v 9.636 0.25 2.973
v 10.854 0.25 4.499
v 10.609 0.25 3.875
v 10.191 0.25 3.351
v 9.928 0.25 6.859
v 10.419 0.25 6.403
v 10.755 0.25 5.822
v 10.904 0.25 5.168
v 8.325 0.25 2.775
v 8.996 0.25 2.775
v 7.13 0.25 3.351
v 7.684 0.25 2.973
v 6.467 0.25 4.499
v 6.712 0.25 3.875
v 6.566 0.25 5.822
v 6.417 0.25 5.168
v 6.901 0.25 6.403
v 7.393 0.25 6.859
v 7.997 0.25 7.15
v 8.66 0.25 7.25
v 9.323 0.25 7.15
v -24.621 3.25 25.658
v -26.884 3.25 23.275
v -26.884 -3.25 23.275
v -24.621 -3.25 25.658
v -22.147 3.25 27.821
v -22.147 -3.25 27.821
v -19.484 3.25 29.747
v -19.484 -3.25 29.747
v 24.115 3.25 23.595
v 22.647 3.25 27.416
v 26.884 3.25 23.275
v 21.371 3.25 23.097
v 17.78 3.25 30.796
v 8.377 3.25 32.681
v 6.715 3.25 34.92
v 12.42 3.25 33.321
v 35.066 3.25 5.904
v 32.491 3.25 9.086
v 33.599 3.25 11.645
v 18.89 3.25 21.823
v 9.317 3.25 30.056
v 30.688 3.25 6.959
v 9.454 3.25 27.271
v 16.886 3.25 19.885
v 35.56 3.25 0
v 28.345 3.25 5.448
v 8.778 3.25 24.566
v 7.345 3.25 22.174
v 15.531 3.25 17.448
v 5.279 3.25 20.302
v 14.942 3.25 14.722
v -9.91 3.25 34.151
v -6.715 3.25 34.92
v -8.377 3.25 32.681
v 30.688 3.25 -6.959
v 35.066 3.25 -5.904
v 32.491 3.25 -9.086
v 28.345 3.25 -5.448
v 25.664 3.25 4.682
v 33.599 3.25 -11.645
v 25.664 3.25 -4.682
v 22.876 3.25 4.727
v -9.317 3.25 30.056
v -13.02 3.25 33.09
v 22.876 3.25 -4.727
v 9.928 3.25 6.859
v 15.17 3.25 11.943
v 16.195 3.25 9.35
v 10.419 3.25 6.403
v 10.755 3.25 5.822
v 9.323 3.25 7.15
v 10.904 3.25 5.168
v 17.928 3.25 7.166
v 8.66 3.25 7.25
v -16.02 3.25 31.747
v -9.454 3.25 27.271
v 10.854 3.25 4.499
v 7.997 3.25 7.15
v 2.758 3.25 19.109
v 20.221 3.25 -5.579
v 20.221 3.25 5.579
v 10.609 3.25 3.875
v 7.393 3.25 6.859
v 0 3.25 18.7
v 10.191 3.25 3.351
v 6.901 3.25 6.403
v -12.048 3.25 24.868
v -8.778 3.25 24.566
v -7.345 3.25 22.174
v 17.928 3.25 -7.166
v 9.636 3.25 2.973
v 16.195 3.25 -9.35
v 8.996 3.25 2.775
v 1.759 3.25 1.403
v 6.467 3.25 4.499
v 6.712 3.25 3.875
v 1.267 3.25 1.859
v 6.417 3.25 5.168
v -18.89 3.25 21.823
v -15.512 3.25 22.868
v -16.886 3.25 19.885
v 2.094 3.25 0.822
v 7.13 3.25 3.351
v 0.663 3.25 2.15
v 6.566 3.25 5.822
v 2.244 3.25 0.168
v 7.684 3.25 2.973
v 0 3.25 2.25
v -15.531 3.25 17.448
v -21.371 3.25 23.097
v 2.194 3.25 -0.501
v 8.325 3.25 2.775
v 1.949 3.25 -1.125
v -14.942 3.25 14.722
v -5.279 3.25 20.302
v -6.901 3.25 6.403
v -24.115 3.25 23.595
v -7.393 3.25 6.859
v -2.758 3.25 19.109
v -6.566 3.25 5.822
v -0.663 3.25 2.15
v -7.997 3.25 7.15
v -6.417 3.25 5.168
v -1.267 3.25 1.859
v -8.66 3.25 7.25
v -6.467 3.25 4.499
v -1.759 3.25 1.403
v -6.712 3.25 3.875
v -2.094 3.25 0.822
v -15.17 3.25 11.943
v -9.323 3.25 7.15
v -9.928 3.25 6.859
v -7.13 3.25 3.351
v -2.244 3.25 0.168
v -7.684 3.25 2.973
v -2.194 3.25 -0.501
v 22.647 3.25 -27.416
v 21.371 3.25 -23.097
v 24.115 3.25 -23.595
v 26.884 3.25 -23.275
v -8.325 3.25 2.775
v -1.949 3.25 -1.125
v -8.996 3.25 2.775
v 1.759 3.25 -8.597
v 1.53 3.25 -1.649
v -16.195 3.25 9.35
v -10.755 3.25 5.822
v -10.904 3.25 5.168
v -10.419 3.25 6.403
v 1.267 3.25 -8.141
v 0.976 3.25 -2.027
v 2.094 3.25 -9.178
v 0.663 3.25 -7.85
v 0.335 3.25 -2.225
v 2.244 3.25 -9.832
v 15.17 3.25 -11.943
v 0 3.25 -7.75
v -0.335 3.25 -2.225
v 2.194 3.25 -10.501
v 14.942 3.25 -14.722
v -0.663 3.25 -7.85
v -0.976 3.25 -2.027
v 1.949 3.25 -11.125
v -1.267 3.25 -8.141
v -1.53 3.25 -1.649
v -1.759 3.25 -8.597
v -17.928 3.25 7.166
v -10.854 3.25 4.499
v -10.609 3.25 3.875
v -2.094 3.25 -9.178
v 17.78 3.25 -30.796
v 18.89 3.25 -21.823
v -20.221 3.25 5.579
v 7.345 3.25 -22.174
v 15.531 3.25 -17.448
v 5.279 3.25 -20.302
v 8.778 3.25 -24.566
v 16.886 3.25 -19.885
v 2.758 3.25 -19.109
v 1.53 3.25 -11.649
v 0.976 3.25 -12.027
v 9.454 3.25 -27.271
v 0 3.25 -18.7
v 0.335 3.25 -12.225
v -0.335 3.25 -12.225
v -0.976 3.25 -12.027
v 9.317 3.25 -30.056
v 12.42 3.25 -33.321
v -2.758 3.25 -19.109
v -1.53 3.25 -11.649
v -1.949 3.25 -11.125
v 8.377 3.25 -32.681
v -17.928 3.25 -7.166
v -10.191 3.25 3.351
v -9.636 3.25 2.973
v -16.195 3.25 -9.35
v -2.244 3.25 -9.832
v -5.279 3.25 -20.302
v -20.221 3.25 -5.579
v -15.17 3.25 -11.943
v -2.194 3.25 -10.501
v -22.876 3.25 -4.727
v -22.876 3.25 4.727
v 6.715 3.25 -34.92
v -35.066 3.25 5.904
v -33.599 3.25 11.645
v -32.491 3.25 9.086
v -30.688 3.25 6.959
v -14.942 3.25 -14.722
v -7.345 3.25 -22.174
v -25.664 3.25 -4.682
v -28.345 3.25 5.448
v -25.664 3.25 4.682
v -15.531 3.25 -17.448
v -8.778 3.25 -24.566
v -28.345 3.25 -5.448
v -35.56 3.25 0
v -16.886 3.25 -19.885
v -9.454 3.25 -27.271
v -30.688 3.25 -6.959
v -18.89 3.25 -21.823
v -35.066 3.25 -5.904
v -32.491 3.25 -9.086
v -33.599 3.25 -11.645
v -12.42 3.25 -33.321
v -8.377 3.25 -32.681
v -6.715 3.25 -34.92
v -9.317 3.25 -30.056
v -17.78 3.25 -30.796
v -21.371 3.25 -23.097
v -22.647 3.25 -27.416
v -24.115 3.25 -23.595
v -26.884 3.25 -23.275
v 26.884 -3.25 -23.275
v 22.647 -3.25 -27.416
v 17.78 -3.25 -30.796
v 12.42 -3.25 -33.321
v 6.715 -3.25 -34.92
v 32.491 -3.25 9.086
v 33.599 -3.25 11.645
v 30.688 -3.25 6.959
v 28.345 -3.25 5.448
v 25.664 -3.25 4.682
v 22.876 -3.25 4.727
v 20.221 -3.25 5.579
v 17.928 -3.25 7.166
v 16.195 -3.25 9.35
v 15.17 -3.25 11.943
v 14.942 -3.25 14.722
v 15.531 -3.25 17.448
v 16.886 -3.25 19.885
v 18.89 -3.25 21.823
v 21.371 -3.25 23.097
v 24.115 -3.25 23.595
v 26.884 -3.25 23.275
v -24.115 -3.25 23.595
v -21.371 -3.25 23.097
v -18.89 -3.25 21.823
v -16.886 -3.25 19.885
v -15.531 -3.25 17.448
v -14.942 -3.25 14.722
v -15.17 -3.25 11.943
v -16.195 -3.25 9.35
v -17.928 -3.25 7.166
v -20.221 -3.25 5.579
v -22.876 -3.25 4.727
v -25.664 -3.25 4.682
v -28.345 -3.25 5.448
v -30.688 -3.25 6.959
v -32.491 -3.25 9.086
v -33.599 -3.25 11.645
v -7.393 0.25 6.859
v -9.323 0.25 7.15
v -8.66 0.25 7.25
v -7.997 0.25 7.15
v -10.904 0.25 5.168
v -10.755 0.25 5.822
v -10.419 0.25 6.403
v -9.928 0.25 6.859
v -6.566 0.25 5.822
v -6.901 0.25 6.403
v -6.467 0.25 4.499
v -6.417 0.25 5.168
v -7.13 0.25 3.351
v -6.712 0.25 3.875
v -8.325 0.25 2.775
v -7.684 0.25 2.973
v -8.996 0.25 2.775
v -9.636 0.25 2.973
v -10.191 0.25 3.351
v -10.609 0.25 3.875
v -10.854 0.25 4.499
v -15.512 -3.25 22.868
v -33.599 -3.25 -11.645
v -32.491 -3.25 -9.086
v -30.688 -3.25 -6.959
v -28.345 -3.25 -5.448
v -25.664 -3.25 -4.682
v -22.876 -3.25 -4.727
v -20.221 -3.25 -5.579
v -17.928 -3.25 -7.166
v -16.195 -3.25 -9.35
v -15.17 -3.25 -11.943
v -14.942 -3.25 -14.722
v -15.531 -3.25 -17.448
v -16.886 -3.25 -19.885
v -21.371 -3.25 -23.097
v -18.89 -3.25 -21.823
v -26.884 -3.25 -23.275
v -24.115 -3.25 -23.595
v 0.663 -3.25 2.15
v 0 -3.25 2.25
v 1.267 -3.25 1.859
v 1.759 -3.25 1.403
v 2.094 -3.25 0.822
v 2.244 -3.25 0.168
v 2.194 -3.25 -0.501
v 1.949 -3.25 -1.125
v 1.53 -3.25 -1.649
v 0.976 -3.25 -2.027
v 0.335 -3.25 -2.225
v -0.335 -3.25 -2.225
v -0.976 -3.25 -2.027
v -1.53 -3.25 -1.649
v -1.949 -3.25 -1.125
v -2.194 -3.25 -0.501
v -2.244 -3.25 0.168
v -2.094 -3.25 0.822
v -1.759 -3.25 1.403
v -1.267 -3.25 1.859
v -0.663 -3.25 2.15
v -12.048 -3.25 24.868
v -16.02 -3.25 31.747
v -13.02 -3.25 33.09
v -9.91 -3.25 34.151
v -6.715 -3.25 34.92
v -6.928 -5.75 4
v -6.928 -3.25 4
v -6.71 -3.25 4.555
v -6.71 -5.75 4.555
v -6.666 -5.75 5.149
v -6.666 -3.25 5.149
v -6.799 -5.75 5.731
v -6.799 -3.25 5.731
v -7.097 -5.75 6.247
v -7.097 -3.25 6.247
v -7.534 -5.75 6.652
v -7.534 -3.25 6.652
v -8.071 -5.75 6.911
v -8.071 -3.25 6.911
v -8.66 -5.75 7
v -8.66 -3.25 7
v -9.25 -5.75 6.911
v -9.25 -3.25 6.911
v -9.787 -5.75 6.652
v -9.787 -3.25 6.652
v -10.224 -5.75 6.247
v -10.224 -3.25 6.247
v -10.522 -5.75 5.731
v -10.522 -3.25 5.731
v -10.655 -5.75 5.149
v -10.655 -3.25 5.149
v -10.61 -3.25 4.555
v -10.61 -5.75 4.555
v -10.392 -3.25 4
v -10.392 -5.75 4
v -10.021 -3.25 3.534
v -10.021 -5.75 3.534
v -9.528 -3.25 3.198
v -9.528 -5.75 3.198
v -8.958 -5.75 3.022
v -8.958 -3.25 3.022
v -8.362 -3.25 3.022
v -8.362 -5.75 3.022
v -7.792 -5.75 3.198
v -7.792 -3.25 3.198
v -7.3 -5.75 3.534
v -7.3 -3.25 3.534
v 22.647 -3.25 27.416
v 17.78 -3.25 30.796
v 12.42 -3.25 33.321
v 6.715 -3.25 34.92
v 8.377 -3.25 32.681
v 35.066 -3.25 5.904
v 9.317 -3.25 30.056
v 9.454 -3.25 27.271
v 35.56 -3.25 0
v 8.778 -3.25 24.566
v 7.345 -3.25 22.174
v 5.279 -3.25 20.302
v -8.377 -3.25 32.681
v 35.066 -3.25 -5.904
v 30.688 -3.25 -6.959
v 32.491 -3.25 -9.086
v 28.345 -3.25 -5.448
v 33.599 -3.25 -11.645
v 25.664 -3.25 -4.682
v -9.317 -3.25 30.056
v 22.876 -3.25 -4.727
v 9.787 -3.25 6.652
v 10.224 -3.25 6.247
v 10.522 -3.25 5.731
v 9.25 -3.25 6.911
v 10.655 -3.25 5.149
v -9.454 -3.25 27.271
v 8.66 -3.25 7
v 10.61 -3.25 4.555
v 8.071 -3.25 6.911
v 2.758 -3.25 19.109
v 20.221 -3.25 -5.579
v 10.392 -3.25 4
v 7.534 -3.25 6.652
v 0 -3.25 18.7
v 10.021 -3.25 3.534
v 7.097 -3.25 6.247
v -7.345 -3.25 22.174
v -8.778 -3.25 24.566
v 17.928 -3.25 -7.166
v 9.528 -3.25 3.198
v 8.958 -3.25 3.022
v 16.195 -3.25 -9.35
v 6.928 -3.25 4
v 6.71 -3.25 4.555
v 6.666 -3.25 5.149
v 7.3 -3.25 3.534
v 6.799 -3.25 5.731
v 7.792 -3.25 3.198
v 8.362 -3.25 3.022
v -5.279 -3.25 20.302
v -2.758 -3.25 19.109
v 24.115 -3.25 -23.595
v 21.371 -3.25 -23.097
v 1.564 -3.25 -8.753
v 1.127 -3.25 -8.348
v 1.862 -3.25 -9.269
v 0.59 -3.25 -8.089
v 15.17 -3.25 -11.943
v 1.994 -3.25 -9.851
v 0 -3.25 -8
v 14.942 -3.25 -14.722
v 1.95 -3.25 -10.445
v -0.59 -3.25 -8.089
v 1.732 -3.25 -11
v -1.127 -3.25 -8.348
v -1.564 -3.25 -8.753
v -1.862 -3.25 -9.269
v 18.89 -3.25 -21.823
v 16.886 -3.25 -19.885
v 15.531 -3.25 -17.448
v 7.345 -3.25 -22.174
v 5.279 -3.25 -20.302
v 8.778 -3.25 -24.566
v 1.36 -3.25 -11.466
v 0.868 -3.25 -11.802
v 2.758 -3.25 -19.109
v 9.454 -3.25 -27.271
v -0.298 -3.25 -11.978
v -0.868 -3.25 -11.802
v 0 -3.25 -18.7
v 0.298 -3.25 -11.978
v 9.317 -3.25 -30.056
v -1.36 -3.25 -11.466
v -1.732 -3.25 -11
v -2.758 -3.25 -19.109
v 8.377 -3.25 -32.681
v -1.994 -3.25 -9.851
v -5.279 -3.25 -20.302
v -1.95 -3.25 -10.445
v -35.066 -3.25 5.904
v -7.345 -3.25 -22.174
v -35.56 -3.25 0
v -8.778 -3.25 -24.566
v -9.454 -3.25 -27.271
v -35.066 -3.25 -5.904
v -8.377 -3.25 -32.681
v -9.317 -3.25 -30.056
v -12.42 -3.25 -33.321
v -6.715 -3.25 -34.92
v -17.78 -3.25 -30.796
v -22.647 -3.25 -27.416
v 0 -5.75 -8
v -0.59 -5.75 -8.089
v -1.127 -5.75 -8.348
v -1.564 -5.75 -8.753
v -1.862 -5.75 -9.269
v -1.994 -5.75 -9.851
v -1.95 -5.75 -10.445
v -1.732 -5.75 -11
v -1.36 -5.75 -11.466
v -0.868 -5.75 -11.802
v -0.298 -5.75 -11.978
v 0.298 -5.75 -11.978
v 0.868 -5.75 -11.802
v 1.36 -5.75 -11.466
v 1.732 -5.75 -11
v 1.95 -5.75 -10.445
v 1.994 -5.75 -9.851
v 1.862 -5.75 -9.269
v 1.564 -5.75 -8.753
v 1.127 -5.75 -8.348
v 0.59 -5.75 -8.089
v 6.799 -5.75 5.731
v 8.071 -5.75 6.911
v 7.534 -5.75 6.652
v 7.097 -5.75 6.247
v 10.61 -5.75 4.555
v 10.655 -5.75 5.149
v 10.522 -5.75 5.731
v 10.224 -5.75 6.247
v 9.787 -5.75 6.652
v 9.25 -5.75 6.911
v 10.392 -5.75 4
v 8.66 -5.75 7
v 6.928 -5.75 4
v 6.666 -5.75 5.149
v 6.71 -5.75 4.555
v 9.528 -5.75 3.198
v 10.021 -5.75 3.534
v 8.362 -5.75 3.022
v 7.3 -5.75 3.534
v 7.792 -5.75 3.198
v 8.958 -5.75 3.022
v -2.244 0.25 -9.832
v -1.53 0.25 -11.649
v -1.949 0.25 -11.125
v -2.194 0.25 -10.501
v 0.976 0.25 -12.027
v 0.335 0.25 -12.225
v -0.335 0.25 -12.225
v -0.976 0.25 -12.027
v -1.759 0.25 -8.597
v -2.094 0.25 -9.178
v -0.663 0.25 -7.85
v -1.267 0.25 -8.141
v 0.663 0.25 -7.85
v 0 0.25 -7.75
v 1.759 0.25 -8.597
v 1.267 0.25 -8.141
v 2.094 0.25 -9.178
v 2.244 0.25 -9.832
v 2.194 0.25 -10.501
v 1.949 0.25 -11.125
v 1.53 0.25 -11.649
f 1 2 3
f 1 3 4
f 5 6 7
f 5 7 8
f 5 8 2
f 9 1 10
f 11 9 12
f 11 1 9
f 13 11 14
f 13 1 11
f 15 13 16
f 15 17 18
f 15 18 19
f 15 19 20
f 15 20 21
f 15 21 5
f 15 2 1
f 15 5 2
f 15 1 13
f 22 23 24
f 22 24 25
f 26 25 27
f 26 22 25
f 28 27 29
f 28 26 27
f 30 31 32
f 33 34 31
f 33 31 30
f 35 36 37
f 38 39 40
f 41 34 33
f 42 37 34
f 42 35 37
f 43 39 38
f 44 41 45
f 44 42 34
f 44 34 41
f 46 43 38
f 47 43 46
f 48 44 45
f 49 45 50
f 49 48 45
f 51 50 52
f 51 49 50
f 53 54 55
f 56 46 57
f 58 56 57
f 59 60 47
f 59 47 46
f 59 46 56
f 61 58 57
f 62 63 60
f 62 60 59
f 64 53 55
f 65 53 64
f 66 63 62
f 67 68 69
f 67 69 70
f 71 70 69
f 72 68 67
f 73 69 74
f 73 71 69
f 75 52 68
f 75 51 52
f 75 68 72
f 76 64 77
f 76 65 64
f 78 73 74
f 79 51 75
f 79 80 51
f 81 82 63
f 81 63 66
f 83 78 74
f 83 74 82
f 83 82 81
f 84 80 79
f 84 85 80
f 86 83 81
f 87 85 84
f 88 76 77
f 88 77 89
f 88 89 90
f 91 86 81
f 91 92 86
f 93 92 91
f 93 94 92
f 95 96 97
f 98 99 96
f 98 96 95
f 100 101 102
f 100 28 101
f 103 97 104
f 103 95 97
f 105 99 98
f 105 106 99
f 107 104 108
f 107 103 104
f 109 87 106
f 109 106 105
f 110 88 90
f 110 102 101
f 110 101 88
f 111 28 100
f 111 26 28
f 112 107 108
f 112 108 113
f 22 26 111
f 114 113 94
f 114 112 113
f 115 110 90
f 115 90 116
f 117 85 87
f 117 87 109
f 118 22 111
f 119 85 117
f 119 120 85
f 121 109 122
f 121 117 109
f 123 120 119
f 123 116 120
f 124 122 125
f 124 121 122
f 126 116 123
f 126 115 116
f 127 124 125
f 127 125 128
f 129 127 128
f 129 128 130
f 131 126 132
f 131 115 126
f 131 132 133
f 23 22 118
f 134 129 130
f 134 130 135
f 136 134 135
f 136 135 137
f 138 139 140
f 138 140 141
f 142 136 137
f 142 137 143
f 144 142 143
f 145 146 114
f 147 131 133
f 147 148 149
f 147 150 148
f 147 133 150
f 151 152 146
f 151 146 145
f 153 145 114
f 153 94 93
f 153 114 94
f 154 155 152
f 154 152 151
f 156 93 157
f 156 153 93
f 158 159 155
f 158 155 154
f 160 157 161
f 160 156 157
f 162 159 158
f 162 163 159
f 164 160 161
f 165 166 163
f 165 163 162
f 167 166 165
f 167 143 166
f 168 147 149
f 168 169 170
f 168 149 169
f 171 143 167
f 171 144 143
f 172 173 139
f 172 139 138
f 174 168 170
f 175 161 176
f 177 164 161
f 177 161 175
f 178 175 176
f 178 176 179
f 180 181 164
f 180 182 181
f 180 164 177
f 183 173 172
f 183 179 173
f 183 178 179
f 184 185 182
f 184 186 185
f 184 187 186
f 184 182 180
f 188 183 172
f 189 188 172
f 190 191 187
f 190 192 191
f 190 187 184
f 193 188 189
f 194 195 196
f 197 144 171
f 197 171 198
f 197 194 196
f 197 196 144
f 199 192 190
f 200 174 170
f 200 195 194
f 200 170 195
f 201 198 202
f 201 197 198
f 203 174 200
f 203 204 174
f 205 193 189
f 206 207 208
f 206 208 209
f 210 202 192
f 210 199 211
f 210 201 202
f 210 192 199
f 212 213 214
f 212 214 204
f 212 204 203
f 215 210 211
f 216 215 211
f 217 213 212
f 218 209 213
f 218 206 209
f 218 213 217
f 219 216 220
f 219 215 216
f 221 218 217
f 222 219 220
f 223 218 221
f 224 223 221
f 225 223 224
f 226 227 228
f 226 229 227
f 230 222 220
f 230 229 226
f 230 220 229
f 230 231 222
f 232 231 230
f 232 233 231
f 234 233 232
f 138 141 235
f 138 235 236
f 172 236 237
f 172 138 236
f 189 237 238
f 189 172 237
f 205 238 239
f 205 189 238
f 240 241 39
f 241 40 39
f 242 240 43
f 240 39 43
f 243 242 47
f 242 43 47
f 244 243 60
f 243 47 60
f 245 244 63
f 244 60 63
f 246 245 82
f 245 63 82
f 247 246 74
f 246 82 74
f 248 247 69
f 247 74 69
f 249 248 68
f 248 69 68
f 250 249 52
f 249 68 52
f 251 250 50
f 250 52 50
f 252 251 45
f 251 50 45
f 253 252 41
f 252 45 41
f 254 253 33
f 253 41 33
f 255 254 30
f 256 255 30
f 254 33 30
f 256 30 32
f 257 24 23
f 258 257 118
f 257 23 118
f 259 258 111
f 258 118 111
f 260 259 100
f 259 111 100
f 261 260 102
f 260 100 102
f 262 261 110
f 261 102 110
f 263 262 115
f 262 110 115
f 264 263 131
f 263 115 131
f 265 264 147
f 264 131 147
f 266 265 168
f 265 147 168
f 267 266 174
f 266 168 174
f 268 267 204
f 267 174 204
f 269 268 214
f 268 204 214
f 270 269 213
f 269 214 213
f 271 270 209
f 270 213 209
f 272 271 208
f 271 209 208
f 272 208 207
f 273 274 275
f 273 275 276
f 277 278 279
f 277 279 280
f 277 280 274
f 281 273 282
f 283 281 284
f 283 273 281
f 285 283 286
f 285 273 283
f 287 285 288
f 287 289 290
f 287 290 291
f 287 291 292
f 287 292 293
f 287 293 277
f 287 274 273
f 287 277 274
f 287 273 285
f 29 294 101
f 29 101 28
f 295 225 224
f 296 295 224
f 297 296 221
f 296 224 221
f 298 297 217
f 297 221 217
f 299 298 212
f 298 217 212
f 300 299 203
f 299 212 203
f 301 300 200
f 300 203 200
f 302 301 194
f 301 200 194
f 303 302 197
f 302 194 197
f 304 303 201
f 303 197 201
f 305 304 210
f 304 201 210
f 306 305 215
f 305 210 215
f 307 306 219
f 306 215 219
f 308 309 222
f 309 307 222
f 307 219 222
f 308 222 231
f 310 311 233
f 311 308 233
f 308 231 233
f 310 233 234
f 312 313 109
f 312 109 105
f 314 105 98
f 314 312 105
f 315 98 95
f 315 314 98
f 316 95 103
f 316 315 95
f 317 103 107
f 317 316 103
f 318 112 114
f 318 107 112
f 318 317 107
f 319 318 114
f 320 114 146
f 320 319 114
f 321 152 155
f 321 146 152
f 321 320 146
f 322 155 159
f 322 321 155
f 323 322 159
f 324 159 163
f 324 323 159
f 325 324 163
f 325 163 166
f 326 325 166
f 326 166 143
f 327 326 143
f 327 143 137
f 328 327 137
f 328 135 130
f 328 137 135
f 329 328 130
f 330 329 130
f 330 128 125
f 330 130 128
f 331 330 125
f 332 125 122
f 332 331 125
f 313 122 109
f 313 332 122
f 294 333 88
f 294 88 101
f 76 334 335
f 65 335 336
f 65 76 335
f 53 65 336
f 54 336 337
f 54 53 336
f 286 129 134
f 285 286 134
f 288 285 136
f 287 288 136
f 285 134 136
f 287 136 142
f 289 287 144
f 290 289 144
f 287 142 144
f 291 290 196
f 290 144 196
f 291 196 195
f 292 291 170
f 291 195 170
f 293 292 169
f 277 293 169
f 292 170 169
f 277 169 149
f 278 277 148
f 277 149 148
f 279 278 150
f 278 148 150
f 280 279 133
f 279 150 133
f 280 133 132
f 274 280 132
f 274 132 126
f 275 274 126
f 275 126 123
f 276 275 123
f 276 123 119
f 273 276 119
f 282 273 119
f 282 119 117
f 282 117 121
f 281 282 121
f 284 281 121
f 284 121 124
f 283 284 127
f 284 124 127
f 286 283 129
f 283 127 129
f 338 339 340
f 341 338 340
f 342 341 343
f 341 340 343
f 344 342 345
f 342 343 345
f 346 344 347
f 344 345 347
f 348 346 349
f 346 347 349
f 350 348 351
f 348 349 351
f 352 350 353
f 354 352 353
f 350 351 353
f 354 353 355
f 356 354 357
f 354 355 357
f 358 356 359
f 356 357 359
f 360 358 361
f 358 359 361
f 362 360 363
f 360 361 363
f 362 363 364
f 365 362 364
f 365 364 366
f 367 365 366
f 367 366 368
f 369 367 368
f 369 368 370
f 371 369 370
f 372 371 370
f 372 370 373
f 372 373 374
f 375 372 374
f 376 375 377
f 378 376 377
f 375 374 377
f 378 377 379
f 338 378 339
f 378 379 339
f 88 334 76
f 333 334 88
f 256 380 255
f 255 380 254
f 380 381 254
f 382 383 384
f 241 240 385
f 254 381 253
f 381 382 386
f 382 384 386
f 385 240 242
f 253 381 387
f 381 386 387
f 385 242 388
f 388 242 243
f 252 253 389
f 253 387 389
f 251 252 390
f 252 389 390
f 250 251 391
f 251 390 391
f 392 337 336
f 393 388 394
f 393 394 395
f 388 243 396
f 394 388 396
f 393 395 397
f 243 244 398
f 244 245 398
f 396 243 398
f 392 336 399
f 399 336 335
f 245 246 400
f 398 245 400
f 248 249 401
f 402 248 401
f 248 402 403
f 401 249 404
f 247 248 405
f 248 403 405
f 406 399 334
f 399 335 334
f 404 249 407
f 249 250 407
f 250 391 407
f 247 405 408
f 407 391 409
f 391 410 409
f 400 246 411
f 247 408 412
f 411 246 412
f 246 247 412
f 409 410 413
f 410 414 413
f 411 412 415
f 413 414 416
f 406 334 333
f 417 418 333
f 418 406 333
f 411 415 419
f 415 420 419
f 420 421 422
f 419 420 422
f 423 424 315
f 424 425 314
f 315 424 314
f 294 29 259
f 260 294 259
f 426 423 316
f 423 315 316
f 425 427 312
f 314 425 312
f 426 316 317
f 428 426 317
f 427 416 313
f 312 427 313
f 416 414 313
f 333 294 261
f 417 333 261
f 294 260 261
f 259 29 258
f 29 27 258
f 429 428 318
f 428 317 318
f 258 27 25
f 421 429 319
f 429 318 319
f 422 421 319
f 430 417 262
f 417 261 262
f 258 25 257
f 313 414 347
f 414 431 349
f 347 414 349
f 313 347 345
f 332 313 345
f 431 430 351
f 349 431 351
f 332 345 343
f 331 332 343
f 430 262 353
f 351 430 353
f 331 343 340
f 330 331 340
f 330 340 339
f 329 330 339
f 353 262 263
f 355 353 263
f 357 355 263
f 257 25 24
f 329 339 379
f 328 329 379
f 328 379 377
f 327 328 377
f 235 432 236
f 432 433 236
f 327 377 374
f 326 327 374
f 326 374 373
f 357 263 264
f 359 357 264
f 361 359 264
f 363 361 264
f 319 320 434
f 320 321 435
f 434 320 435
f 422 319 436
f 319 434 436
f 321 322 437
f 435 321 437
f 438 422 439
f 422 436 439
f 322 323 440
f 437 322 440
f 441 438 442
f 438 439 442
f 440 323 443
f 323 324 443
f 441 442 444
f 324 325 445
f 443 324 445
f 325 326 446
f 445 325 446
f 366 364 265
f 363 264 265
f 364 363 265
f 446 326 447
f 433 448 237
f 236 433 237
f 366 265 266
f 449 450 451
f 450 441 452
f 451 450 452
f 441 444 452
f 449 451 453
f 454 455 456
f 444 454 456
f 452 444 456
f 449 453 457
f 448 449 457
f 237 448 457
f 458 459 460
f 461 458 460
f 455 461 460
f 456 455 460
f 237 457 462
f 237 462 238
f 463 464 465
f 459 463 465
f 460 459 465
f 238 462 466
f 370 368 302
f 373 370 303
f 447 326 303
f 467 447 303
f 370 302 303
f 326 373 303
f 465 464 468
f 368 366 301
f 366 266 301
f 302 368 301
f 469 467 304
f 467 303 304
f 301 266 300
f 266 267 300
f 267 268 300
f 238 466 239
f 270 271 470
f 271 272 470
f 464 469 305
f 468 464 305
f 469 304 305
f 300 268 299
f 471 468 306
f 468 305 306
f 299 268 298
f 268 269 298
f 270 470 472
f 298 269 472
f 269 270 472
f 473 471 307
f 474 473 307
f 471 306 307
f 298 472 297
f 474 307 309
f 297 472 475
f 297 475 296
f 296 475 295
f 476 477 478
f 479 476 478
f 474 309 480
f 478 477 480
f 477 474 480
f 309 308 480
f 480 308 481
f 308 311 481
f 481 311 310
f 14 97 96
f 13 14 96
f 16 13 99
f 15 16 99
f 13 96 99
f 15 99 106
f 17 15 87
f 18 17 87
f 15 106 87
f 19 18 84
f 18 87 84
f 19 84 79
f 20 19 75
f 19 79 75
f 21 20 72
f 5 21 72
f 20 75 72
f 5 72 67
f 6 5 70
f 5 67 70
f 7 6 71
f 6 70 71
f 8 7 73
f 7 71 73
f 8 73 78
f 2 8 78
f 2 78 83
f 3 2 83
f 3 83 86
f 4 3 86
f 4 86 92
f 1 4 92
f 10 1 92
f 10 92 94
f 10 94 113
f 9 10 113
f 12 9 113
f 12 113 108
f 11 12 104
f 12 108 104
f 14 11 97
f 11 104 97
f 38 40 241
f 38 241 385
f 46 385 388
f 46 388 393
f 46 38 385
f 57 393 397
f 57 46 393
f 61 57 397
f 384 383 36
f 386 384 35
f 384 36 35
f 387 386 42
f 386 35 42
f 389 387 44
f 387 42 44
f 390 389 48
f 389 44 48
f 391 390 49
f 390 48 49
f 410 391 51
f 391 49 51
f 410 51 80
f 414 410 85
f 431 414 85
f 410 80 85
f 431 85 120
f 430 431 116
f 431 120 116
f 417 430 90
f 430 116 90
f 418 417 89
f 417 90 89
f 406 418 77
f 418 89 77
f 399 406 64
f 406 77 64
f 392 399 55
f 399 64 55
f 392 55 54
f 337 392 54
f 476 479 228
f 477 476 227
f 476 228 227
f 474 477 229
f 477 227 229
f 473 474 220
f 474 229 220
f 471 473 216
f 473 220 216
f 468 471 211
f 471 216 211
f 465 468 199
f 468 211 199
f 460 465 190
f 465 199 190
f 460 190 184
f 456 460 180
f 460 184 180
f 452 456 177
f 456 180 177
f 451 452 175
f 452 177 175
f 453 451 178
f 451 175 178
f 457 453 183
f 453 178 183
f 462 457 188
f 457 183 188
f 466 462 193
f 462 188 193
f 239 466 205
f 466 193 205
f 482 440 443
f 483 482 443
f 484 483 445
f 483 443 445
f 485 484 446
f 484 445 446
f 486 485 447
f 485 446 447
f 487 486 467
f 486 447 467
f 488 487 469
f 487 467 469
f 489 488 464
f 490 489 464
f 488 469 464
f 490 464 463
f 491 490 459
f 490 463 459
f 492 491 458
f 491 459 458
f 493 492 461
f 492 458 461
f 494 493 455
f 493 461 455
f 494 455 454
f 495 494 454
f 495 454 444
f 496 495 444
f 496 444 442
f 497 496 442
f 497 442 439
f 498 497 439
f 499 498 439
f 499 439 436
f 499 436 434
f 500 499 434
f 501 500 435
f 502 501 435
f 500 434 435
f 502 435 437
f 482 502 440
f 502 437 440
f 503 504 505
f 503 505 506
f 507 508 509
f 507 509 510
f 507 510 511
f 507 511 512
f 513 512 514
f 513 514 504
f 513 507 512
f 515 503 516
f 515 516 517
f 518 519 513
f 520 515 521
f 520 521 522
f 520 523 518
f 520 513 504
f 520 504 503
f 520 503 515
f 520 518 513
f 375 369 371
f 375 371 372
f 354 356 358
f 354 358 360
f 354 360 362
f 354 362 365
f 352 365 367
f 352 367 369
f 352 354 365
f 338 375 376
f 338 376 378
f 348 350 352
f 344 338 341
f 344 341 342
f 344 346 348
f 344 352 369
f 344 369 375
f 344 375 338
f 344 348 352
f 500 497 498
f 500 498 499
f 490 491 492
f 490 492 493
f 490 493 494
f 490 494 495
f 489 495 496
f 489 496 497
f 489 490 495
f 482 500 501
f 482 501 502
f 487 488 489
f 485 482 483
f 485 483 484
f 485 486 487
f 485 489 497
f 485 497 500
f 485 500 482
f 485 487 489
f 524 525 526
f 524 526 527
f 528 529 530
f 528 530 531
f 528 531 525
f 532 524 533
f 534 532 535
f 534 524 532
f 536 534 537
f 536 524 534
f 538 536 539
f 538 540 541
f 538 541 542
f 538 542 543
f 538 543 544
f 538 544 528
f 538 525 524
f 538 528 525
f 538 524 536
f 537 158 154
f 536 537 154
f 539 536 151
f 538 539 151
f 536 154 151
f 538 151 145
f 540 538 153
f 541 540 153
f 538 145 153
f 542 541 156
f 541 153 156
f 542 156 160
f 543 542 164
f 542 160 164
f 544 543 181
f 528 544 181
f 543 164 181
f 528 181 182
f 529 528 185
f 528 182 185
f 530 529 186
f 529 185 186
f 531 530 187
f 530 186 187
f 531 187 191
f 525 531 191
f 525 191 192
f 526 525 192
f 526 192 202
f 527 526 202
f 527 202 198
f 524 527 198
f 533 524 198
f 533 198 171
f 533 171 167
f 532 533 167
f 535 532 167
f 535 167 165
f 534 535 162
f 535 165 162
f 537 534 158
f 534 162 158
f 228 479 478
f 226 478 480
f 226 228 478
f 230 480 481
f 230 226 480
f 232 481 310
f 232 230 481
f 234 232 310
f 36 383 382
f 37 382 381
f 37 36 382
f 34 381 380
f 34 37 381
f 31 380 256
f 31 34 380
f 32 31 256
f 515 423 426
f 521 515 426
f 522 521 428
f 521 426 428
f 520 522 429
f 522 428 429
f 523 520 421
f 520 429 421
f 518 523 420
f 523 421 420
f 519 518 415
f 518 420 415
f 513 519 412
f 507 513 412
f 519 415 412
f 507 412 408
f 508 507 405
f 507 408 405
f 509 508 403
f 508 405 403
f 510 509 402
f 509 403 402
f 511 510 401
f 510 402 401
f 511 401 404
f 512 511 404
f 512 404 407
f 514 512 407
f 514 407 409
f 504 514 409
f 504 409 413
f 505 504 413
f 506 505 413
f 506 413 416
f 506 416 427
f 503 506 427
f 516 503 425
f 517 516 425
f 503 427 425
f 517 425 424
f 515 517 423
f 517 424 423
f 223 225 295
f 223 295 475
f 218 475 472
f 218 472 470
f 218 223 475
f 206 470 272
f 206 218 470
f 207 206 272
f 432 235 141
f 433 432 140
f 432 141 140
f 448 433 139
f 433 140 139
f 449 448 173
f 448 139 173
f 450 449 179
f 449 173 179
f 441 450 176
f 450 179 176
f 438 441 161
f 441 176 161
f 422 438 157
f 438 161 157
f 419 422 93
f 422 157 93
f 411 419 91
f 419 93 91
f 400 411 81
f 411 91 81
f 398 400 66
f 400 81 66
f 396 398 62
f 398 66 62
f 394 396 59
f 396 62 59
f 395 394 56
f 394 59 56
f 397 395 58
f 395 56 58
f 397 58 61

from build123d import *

# Parameters (mm, degrees)
SKETCH1_R               = 35.56
BOSS_EXTRUDE1_DEPTH     = 3.25
SKETCH2_R               = 9.5
CUT_EXTRUDE1_DEPTH      = 51.707762719
CIRPATTERN1_COUNT       = 6
SKETCH3_R               = 2.25
CUT_EXTRUDE2_DEPTH      = 3
CIRPATTERN2_COUNT       = 3
CUT_EXTRUDE3_DEPTH      = 51.261210864
CUT_EXTRUDE3_DEPTH_BACK = 51.261210864
SKETCH4_R               = 2.25
SKETCH5_R               = 2
BOSS_EXTRUDE2_DEPTH     = 2.5
CIRPATTERN3_COUNT       = 3
CUT_EXTRUDE4_DEPTH      = 51.261210864


with BuildPart() as part:
    # Sketch1 → Boss-Extrude1 (new, symmetric)
    with BuildSketch(Plane(origin=(0, 0, 0), x_dir=(1, 0, 0), z_dir=(0, 1, 0))):
        with Locations(Location((0, 0, 0), (0, 0, 90))):
            Circle(SKETCH1_R)
    extrude(amount=BOSS_EXTRUDE1_DEPTH, both=True)

    # Sketch2 → Cut-Extrude1 (cut, through all)
    with BuildSketch(Plane(origin=(0, 3.25, 0), x_dir=(1, 0, 0), z_dir=(0, 1, 0))):
        with Locations((0, 28.2)):
            Circle(SKETCH2_R)
    cut_extrude1 = extrude(amount=-CUT_EXTRUDE1_DEPTH, mode=Mode.SUBTRACT)

    # CirPattern1: Cut-Extrude1 ×6 about axis
    cirpattern1_axis = Axis((0, 0, 0), (0, 1, 0))
    for i in range(1, CIRPATTERN1_COUNT):
        add(cut_extrude1.rotate(cirpattern1_axis, i * 360 / CIRPATTERN1_COUNT), mode=Mode.SUBTRACT)

    # Sketch3 → Cut-Extrude2 (cut)
    with BuildSketch(Plane(origin=(0, 3.25, 0), x_dir=(1, 0, 0), z_dir=(0, 1, 0))):
        with Locations(Location((0, 10, 0), (0, 0, 270))):
            Circle(SKETCH3_R)
    cut_extrude2 = extrude(amount=-CUT_EXTRUDE2_DEPTH, mode=Mode.SUBTRACT)

    # CirPattern2: Cut-Extrude2 ×3 about axis
    cirpattern2_axis = Axis((0, 0, 0), (0, 1, 0))
    for i in range(1, CIRPATTERN2_COUNT):
        add(cut_extrude2.rotate(cirpattern2_axis, i * 360 / CIRPATTERN2_COUNT), mode=Mode.SUBTRACT)

    # Sketch4 → Cut-Extrude3 (cut, two sides: drawn at the far end of the back side and taken through both)
    with BuildSketch(Plane(origin=(0, 3.25, 0), x_dir=(1, 0, 0), z_dir=(0, 1, 0)).offset(-CUT_EXTRUDE3_DEPTH_BACK)):
        with Locations(Location((0, 0, 0), (0, 0, 270))):
            Circle(SKETCH4_R)
    extrude(amount=CUT_EXTRUDE3_DEPTH + CUT_EXTRUDE3_DEPTH_BACK, mode=Mode.SUBTRACT)

    # Sketch5 → Boss-Extrude2 (add)
    with BuildSketch(Plane(origin=(0, -3.25, 0), x_dir=(-1, 0, 0), z_dir=(0, -1, 0))):
        with Locations(Location((0, 10, 0), (0, 0, 270))):
            Circle(SKETCH5_R)
    boss_extrude2 = extrude(amount=BOSS_EXTRUDE2_DEPTH)

    # CirPattern3: Boss-Extrude2 ×3 about axis
    cirpattern3_axis = Axis((0, 0, 0), (0, 1, 0))
    for i in range(1, CIRPATTERN3_COUNT):
        add(boss_extrude2.rotate(cirpattern3_axis, i * 360 / CIRPATTERN3_COUNT))

    # Sketch6 → Cut-Extrude4 (cut, through all)
    with BuildSketch(Plane.XZ.offset(3.25)):
        Polygon((-12.047949192, 24.867660128), (-15.512050808, 22.867660128), (-19.512050808, 29.795863359), (-16.047949192, 31.795863359), align=None)
    extrude(amount=-CUT_EXTRUDE4_DEPTH, mode=Mode.SUBTRACT)


solid = part.part
